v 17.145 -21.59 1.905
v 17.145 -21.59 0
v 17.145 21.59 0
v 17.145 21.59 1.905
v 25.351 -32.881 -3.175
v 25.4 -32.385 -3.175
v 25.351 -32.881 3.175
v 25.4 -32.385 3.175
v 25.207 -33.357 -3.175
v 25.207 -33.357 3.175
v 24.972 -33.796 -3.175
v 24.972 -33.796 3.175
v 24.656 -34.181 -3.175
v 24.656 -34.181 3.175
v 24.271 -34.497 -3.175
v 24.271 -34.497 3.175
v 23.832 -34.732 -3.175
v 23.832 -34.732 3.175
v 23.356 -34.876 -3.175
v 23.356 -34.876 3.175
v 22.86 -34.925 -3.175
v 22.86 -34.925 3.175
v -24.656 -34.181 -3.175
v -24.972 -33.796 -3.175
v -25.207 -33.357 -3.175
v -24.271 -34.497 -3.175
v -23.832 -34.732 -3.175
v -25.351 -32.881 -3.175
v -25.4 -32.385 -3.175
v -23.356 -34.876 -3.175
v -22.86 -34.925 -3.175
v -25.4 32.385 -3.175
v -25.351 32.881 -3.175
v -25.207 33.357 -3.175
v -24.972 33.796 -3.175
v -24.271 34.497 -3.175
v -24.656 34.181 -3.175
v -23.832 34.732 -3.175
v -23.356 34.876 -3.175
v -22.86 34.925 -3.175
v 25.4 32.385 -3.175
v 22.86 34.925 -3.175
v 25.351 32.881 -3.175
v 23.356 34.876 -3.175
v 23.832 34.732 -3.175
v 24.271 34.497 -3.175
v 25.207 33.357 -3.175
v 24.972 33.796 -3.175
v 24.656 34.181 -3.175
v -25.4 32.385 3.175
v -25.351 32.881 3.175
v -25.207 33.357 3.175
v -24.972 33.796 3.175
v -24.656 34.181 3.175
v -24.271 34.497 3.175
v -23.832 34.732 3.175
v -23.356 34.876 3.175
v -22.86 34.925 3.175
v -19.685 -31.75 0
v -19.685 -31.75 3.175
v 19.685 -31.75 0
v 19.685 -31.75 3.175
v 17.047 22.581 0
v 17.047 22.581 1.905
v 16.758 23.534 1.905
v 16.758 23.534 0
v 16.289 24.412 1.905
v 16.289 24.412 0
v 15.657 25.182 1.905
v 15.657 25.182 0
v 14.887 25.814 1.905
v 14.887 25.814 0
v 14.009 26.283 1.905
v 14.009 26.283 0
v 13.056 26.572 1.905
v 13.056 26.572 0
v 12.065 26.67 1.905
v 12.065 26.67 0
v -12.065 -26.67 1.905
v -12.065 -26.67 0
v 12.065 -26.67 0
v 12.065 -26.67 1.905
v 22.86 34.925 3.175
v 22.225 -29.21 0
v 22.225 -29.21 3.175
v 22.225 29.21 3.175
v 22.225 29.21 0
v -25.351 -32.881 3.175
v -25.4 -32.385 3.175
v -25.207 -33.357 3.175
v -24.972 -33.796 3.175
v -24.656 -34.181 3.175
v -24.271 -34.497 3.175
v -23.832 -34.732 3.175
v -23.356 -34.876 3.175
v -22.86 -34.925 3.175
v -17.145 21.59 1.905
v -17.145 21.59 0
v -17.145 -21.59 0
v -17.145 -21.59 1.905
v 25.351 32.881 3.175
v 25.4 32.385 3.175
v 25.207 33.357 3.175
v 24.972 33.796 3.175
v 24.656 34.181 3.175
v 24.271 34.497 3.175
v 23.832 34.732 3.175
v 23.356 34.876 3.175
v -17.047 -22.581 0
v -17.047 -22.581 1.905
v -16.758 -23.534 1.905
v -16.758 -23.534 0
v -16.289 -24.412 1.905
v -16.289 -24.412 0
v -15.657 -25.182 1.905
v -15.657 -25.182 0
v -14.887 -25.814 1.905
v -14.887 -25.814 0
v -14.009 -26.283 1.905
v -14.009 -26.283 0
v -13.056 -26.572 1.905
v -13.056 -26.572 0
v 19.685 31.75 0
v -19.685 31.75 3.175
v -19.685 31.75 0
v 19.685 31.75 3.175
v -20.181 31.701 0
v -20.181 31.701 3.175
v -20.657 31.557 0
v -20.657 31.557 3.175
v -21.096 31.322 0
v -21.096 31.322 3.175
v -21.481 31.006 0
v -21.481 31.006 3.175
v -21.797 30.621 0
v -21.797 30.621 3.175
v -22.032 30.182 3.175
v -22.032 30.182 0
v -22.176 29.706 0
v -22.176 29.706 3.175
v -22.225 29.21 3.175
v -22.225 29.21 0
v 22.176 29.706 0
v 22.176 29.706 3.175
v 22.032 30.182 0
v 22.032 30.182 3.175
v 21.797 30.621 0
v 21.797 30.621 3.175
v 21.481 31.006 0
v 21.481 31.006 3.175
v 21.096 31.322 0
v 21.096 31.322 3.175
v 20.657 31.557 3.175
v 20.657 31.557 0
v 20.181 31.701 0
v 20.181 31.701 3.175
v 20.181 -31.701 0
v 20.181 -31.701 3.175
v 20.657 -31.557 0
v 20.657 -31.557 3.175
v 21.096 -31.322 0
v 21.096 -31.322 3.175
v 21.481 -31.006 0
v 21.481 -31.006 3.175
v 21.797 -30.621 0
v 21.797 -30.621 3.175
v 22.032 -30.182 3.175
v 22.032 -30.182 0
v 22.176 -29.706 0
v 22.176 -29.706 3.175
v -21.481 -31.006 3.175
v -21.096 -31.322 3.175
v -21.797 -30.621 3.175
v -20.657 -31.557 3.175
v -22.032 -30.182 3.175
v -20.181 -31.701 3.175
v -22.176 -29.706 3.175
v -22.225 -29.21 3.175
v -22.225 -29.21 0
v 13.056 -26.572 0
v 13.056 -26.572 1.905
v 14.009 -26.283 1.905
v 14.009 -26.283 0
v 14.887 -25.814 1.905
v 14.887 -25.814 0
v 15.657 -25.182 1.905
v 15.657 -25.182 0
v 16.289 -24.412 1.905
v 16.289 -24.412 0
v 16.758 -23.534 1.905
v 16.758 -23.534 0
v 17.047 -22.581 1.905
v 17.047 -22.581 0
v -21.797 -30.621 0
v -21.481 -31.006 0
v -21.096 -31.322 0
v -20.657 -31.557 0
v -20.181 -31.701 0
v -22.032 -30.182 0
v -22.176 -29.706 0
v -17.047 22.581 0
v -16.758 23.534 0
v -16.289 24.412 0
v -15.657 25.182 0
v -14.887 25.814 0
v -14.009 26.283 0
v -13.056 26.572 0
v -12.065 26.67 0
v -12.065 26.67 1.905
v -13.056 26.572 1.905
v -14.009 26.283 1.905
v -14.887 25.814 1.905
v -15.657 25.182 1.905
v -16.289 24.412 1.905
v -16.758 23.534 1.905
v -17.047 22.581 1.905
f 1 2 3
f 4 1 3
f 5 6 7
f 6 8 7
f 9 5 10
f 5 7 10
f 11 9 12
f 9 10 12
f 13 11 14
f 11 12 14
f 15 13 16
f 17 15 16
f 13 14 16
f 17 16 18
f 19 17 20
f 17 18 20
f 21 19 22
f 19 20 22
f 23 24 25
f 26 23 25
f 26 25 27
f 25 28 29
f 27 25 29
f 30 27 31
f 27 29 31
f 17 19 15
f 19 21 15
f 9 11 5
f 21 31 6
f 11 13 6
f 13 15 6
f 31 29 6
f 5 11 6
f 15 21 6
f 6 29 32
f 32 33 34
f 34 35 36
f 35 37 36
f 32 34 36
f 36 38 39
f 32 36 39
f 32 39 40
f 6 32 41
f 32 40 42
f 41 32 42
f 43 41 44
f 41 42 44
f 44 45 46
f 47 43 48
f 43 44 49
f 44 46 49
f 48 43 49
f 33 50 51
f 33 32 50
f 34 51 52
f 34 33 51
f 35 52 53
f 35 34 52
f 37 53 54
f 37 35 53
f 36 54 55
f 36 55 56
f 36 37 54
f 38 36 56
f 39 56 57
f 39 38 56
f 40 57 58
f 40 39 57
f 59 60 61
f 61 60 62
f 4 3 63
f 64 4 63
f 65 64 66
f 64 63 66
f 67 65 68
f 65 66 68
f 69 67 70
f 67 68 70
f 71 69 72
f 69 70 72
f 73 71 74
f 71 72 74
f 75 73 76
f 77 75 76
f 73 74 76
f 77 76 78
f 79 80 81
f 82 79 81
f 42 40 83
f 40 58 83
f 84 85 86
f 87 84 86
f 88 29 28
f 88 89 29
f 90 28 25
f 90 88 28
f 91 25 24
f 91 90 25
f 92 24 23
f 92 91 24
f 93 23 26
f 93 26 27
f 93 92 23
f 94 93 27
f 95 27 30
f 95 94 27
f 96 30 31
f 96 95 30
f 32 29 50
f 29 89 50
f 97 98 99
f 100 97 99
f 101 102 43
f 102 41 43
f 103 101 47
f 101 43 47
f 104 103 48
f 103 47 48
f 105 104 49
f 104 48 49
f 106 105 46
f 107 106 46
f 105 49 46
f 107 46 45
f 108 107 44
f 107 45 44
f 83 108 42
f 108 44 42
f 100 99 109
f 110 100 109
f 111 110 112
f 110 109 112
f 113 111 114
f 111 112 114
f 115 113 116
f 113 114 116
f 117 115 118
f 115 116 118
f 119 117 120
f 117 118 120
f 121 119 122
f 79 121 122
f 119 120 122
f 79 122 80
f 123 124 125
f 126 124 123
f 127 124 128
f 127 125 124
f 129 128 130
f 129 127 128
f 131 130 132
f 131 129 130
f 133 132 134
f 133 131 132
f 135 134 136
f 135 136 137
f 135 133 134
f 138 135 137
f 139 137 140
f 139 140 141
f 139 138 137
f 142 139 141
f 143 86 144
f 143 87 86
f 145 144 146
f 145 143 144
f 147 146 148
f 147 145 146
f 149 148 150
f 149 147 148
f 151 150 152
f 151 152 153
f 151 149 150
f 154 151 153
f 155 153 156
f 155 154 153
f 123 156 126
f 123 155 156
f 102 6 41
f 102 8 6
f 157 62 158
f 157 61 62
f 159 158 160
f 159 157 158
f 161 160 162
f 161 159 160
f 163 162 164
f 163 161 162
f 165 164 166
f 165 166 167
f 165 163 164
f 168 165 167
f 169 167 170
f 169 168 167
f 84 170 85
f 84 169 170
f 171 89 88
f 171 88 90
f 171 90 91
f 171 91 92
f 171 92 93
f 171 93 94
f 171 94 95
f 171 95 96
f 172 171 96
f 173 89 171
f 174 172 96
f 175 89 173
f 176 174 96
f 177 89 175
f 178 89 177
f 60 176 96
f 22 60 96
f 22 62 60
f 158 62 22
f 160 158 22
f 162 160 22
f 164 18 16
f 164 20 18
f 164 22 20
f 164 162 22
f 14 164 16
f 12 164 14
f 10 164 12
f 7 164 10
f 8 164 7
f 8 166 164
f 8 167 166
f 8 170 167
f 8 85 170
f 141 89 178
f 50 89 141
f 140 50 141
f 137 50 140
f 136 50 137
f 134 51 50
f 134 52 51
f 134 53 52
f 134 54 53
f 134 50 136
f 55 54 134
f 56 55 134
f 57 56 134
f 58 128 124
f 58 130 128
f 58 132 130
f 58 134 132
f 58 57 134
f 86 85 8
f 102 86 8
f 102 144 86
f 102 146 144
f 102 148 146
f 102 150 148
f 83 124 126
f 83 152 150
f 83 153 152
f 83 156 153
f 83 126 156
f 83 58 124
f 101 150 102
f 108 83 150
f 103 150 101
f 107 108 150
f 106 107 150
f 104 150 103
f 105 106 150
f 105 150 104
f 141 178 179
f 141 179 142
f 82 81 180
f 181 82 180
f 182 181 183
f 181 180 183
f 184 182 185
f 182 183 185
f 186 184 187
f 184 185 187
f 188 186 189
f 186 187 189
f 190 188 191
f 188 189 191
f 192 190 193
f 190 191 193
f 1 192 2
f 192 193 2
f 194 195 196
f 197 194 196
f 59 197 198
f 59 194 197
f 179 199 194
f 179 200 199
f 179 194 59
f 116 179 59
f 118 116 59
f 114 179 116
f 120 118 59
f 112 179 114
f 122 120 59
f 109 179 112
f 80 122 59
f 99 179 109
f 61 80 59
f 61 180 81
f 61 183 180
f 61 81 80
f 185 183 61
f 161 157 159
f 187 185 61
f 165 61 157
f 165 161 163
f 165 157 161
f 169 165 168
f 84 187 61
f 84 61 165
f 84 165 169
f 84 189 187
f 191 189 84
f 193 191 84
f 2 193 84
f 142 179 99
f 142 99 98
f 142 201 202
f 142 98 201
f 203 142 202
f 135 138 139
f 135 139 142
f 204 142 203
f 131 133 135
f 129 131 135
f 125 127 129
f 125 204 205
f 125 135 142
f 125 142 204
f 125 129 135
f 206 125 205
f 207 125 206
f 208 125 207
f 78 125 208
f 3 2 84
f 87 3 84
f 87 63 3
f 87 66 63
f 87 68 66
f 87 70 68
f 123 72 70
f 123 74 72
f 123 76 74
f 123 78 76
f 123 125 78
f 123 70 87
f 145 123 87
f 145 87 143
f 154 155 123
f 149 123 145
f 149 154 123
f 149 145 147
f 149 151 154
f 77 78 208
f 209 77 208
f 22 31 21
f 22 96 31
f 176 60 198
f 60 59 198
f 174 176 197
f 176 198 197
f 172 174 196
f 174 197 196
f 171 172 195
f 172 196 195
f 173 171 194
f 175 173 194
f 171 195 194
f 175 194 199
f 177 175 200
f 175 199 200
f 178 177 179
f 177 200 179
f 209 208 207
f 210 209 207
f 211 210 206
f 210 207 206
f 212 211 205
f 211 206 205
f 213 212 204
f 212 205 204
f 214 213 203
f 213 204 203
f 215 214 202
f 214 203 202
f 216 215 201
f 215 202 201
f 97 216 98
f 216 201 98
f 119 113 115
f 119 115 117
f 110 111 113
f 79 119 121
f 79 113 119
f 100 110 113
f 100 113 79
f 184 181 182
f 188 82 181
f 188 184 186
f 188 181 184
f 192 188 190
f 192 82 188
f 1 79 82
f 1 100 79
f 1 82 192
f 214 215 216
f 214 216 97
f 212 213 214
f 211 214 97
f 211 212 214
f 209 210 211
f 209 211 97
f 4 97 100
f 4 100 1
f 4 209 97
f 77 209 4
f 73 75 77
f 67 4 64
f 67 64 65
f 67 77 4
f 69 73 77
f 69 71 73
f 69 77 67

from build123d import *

# Parameters (mm, degrees)
F0_W     = 50.8
F0_H     = 69.85
F1_DEPTH = 3.175
F2_R     = 2.54
F3_W     = 44.45
F3_H     = 63.5
F4_DEPTH = 3.175
F5_R     = 2.54
F7_DEPTH = 1.905


with BuildPart() as f1:
    # F0 (on Top) → F1 (new body, symmetric)
    with BuildSketch(Plane.XY):
        Rectangle(F0_W, F0_H)
    extrude(amount=F1_DEPTH, both=True)

    # F2
    f2_edges = [f1.edges().sort_by_distance(p)[0] for p in [
        (25.4, -34.925, 0),
        (-25.4, -34.925, 0),
        (25.4, 34.925, 0),
        (-25.4, 34.925, 0),
    ]]
    fillet(f2_edges, radius=F2_R)

    # F3 (on face) → F4 (cut)
    with BuildSketch(Plane.XY.offset(3.175)):
        Rectangle(F3_W, F3_H)
    extrude(amount=-F4_DEPTH, mode=Mode.SUBTRACT)

    # F5
    f5_edges = [f1.edges().sort_by_distance(p)[0] for p in [
        (-22.225, 31.75, 1.5875),
        (22.225, 31.75, 1.5875),
        (-22.225, -31.75, 1.5875),
        (22.225, -31.75, 1.5875),
    ]]
    fillet(f5_edges, radius=F5_R)

    # F6 (on face) → F7 (join)
    with BuildSketch(Plane.XY):
        with BuildLine():
            ThreePointArc((-17.145, -21.59), (-15.657102, -25.182102), (-12.065, -26.67))
            Line((-12.065, -26.67), (12.065, -26.67))
            ThreePointArc((12.065, -26.67), (15.657102, -25.182102), (17.145, -21.59))
            Line((17.145, -21.59), (17.145, 21.59))
            ThreePointArc((17.145, 21.59), (15.657102, 25.182102), (12.065, 26.67))
            Line((12.065, 26.67), (-12.065, 26.67))
            ThreePointArc((-12.065, 26.67), (-15.657102, 25.182102), (-17.145, 21.59))
            Line((-17.145, 21.59), (-17.145, -21.59))
        make_face()
    extrude(amount=F7_DEPTH)


solid = f1.part
